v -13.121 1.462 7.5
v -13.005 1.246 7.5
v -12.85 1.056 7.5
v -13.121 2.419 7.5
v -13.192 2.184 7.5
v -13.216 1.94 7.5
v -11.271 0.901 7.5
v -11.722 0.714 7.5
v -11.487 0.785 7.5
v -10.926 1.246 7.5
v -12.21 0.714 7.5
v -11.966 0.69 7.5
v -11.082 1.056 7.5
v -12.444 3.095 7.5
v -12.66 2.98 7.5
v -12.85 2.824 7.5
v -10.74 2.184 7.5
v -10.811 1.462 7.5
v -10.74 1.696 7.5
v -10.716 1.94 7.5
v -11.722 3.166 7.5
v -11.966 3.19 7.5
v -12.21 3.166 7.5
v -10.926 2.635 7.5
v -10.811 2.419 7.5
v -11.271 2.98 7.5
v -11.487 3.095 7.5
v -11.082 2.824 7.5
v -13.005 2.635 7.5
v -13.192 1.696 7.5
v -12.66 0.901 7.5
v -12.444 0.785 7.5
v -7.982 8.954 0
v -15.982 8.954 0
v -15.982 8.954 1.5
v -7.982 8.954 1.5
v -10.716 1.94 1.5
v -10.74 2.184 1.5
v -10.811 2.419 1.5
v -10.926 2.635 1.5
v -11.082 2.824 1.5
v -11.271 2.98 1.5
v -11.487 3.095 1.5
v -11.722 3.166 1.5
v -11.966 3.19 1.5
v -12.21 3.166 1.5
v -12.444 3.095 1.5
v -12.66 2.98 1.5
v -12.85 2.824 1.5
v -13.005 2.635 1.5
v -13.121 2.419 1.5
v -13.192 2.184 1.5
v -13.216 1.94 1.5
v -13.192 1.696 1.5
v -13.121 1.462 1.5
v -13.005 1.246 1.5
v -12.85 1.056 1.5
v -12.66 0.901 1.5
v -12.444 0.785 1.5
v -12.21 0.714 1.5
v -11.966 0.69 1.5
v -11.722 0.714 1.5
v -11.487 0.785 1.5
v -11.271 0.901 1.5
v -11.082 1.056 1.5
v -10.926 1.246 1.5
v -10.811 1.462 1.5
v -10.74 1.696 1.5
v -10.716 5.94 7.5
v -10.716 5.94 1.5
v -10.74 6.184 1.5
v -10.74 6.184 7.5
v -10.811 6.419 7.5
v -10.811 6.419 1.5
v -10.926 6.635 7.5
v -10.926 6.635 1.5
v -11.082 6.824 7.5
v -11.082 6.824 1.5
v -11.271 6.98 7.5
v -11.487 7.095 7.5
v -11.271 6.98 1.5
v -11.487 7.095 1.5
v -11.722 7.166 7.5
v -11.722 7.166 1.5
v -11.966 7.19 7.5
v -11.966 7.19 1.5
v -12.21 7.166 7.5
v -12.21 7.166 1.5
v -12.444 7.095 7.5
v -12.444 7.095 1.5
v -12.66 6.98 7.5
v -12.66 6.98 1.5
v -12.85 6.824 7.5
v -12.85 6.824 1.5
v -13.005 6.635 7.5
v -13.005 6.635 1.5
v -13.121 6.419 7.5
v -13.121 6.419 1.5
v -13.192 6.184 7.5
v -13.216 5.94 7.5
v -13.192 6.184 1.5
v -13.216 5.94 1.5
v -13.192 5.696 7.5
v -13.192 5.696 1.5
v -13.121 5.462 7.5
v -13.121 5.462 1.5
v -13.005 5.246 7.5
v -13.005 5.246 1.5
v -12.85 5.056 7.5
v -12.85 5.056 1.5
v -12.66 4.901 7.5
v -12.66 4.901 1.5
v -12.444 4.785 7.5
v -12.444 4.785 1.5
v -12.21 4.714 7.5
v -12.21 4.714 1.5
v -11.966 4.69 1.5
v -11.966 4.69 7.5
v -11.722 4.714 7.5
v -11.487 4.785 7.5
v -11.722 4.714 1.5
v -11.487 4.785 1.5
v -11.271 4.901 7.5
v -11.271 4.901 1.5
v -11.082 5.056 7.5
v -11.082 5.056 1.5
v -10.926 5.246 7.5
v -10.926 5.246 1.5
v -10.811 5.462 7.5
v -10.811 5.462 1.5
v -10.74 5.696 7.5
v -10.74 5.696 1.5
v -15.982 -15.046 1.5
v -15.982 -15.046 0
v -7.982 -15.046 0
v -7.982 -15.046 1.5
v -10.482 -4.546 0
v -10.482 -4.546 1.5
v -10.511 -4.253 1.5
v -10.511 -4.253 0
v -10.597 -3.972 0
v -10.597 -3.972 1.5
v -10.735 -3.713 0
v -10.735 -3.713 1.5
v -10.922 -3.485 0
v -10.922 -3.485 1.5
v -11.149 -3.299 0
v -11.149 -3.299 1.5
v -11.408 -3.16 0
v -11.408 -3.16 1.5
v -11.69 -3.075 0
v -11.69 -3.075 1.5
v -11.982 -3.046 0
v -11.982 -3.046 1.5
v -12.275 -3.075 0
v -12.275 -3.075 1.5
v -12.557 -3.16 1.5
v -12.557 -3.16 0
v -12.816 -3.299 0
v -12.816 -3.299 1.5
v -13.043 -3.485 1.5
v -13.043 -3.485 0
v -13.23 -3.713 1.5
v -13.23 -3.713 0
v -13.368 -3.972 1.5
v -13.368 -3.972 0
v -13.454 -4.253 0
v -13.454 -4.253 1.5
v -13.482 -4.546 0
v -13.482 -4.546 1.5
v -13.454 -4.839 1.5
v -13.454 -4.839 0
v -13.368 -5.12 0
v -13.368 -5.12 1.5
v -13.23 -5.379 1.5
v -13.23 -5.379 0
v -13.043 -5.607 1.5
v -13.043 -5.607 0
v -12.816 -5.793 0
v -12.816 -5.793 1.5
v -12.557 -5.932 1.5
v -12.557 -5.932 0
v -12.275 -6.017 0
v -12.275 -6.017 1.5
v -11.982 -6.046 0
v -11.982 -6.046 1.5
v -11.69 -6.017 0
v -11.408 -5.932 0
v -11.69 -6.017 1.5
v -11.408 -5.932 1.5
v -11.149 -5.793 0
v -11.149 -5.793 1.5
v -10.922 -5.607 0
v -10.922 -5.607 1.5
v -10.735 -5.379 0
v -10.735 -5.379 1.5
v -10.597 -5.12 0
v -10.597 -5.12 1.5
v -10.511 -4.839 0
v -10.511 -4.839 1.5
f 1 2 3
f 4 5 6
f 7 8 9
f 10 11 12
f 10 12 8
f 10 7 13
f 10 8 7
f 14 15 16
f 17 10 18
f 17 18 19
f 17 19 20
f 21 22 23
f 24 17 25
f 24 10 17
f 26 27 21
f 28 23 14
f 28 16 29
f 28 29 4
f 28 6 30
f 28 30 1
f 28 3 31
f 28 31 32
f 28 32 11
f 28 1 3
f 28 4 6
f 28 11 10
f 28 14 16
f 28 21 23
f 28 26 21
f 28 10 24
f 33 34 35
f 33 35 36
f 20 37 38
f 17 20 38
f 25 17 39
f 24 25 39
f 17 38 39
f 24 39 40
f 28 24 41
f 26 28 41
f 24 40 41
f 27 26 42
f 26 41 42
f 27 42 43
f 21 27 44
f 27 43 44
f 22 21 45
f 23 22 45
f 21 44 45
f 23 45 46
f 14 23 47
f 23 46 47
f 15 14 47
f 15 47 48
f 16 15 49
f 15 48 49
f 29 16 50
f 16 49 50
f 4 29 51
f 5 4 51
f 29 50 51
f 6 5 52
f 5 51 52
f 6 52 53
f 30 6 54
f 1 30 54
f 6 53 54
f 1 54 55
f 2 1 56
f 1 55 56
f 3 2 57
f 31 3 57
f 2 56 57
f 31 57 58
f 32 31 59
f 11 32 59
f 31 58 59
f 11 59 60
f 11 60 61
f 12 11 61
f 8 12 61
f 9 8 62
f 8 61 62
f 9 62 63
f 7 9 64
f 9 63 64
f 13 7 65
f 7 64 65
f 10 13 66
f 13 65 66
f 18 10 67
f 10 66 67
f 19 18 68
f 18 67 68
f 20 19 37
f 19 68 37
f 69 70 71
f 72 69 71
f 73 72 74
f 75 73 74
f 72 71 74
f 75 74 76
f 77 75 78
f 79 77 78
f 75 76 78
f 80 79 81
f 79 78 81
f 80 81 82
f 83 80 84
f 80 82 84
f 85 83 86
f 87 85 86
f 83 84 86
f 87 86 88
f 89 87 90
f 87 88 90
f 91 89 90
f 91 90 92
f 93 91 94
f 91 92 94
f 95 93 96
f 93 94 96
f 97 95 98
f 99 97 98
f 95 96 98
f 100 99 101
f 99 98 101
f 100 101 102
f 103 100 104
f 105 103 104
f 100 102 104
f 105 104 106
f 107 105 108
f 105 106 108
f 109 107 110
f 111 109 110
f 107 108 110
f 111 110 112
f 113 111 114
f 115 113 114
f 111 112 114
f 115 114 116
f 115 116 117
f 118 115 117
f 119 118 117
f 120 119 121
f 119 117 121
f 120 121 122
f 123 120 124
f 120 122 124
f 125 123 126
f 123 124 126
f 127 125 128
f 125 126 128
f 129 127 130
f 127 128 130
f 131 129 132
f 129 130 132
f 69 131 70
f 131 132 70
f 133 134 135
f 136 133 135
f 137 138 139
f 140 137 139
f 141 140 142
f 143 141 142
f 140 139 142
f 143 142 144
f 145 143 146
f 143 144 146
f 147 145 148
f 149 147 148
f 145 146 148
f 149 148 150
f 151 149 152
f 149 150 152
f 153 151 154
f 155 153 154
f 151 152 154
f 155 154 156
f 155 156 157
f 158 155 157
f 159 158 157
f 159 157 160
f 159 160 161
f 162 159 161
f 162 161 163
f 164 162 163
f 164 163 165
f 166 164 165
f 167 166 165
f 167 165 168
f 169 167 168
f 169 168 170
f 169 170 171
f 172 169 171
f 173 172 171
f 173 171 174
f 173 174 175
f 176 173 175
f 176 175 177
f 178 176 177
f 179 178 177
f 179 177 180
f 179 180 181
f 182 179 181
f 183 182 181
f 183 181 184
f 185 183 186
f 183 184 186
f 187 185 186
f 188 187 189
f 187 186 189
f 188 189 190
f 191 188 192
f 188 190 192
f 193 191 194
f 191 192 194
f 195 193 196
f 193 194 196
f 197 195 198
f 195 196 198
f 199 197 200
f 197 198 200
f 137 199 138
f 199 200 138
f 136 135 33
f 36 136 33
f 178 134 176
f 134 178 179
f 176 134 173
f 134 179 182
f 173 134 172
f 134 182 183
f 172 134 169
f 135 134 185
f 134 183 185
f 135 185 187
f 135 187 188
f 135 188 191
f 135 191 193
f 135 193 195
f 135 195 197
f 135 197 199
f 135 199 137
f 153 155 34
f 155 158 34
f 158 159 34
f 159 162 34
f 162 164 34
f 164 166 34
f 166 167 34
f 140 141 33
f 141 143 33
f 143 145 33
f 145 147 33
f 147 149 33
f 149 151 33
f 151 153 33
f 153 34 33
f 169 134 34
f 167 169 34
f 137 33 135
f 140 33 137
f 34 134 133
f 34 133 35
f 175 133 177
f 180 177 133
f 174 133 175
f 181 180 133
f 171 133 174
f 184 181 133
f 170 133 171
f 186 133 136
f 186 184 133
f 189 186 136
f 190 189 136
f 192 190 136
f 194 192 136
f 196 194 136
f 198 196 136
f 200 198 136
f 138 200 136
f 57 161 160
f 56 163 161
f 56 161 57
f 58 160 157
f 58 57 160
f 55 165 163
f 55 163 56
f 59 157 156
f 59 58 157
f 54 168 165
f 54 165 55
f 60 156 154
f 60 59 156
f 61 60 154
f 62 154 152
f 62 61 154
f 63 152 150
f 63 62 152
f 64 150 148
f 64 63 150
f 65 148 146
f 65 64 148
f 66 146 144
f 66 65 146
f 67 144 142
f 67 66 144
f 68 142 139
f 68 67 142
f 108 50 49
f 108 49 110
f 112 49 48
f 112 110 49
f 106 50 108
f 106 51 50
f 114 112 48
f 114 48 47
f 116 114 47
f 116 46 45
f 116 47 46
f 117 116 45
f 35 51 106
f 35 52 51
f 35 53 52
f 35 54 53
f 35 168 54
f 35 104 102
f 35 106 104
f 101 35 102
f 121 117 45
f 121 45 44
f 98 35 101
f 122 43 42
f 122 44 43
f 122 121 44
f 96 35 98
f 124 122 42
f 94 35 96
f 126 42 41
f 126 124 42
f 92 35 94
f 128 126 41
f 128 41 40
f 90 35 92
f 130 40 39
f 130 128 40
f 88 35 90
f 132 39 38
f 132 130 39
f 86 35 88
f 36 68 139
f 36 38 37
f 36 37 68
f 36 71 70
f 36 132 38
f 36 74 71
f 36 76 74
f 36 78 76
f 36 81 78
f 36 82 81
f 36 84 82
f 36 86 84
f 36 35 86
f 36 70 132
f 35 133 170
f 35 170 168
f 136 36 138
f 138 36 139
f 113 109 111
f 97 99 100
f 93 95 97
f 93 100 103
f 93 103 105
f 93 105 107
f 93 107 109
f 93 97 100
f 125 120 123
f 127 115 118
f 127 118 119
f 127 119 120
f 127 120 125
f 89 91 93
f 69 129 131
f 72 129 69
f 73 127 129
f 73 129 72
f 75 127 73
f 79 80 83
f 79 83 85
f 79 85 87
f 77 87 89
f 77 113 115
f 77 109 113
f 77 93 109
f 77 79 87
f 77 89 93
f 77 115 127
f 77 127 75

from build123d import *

# Parameters (mm, degrees)
SKETCH1_W           = 8
SKETCH1_H           = 24
BOSS_EXTRUDE1_DEPTH = 1.5
SKETCH2_R           = 1.5
CUT_EXTRUDE1_DEPTH  = 2.5
SKETCH3_R           = 1.25
BOSS_EXTRUDE3_DEPTH = 6


with BuildPart() as part:
    # Sketch1 → Boss-Extrude1 (new body)
    with BuildSketch(Plane.XY):
        with Locations((-11.98249453, -3.04595186)):
            Rectangle(SKETCH1_W, SKETCH1_H)
    extrude(amount=BOSS_EXTRUDE1_DEPTH)

    # Sketch2 → Cut-Extrude1 (cut, through all)
    with BuildSketch(Plane.XY.offset(1.5)):
        with Locations((-11.98249453, -4.54595186)):
            Circle(SKETCH2_R)
    extrude(amount=-CUT_EXTRUDE1_DEPTH, mode=Mode.SUBTRACT)

    # Sketch3 → Boss-Extrude3 (add)
    with BuildSketch(Plane.XY.offset(1.5)):
        with Locations((-11.965684197, 5.940322957)):
            Circle(SKETCH3_R)
        with Locations((-11.965684197, 1.940322957)):
            Circle(SKETCH3_R)
    extrude(amount=BOSS_EXTRUDE3_DEPTH)


solid = part.part
